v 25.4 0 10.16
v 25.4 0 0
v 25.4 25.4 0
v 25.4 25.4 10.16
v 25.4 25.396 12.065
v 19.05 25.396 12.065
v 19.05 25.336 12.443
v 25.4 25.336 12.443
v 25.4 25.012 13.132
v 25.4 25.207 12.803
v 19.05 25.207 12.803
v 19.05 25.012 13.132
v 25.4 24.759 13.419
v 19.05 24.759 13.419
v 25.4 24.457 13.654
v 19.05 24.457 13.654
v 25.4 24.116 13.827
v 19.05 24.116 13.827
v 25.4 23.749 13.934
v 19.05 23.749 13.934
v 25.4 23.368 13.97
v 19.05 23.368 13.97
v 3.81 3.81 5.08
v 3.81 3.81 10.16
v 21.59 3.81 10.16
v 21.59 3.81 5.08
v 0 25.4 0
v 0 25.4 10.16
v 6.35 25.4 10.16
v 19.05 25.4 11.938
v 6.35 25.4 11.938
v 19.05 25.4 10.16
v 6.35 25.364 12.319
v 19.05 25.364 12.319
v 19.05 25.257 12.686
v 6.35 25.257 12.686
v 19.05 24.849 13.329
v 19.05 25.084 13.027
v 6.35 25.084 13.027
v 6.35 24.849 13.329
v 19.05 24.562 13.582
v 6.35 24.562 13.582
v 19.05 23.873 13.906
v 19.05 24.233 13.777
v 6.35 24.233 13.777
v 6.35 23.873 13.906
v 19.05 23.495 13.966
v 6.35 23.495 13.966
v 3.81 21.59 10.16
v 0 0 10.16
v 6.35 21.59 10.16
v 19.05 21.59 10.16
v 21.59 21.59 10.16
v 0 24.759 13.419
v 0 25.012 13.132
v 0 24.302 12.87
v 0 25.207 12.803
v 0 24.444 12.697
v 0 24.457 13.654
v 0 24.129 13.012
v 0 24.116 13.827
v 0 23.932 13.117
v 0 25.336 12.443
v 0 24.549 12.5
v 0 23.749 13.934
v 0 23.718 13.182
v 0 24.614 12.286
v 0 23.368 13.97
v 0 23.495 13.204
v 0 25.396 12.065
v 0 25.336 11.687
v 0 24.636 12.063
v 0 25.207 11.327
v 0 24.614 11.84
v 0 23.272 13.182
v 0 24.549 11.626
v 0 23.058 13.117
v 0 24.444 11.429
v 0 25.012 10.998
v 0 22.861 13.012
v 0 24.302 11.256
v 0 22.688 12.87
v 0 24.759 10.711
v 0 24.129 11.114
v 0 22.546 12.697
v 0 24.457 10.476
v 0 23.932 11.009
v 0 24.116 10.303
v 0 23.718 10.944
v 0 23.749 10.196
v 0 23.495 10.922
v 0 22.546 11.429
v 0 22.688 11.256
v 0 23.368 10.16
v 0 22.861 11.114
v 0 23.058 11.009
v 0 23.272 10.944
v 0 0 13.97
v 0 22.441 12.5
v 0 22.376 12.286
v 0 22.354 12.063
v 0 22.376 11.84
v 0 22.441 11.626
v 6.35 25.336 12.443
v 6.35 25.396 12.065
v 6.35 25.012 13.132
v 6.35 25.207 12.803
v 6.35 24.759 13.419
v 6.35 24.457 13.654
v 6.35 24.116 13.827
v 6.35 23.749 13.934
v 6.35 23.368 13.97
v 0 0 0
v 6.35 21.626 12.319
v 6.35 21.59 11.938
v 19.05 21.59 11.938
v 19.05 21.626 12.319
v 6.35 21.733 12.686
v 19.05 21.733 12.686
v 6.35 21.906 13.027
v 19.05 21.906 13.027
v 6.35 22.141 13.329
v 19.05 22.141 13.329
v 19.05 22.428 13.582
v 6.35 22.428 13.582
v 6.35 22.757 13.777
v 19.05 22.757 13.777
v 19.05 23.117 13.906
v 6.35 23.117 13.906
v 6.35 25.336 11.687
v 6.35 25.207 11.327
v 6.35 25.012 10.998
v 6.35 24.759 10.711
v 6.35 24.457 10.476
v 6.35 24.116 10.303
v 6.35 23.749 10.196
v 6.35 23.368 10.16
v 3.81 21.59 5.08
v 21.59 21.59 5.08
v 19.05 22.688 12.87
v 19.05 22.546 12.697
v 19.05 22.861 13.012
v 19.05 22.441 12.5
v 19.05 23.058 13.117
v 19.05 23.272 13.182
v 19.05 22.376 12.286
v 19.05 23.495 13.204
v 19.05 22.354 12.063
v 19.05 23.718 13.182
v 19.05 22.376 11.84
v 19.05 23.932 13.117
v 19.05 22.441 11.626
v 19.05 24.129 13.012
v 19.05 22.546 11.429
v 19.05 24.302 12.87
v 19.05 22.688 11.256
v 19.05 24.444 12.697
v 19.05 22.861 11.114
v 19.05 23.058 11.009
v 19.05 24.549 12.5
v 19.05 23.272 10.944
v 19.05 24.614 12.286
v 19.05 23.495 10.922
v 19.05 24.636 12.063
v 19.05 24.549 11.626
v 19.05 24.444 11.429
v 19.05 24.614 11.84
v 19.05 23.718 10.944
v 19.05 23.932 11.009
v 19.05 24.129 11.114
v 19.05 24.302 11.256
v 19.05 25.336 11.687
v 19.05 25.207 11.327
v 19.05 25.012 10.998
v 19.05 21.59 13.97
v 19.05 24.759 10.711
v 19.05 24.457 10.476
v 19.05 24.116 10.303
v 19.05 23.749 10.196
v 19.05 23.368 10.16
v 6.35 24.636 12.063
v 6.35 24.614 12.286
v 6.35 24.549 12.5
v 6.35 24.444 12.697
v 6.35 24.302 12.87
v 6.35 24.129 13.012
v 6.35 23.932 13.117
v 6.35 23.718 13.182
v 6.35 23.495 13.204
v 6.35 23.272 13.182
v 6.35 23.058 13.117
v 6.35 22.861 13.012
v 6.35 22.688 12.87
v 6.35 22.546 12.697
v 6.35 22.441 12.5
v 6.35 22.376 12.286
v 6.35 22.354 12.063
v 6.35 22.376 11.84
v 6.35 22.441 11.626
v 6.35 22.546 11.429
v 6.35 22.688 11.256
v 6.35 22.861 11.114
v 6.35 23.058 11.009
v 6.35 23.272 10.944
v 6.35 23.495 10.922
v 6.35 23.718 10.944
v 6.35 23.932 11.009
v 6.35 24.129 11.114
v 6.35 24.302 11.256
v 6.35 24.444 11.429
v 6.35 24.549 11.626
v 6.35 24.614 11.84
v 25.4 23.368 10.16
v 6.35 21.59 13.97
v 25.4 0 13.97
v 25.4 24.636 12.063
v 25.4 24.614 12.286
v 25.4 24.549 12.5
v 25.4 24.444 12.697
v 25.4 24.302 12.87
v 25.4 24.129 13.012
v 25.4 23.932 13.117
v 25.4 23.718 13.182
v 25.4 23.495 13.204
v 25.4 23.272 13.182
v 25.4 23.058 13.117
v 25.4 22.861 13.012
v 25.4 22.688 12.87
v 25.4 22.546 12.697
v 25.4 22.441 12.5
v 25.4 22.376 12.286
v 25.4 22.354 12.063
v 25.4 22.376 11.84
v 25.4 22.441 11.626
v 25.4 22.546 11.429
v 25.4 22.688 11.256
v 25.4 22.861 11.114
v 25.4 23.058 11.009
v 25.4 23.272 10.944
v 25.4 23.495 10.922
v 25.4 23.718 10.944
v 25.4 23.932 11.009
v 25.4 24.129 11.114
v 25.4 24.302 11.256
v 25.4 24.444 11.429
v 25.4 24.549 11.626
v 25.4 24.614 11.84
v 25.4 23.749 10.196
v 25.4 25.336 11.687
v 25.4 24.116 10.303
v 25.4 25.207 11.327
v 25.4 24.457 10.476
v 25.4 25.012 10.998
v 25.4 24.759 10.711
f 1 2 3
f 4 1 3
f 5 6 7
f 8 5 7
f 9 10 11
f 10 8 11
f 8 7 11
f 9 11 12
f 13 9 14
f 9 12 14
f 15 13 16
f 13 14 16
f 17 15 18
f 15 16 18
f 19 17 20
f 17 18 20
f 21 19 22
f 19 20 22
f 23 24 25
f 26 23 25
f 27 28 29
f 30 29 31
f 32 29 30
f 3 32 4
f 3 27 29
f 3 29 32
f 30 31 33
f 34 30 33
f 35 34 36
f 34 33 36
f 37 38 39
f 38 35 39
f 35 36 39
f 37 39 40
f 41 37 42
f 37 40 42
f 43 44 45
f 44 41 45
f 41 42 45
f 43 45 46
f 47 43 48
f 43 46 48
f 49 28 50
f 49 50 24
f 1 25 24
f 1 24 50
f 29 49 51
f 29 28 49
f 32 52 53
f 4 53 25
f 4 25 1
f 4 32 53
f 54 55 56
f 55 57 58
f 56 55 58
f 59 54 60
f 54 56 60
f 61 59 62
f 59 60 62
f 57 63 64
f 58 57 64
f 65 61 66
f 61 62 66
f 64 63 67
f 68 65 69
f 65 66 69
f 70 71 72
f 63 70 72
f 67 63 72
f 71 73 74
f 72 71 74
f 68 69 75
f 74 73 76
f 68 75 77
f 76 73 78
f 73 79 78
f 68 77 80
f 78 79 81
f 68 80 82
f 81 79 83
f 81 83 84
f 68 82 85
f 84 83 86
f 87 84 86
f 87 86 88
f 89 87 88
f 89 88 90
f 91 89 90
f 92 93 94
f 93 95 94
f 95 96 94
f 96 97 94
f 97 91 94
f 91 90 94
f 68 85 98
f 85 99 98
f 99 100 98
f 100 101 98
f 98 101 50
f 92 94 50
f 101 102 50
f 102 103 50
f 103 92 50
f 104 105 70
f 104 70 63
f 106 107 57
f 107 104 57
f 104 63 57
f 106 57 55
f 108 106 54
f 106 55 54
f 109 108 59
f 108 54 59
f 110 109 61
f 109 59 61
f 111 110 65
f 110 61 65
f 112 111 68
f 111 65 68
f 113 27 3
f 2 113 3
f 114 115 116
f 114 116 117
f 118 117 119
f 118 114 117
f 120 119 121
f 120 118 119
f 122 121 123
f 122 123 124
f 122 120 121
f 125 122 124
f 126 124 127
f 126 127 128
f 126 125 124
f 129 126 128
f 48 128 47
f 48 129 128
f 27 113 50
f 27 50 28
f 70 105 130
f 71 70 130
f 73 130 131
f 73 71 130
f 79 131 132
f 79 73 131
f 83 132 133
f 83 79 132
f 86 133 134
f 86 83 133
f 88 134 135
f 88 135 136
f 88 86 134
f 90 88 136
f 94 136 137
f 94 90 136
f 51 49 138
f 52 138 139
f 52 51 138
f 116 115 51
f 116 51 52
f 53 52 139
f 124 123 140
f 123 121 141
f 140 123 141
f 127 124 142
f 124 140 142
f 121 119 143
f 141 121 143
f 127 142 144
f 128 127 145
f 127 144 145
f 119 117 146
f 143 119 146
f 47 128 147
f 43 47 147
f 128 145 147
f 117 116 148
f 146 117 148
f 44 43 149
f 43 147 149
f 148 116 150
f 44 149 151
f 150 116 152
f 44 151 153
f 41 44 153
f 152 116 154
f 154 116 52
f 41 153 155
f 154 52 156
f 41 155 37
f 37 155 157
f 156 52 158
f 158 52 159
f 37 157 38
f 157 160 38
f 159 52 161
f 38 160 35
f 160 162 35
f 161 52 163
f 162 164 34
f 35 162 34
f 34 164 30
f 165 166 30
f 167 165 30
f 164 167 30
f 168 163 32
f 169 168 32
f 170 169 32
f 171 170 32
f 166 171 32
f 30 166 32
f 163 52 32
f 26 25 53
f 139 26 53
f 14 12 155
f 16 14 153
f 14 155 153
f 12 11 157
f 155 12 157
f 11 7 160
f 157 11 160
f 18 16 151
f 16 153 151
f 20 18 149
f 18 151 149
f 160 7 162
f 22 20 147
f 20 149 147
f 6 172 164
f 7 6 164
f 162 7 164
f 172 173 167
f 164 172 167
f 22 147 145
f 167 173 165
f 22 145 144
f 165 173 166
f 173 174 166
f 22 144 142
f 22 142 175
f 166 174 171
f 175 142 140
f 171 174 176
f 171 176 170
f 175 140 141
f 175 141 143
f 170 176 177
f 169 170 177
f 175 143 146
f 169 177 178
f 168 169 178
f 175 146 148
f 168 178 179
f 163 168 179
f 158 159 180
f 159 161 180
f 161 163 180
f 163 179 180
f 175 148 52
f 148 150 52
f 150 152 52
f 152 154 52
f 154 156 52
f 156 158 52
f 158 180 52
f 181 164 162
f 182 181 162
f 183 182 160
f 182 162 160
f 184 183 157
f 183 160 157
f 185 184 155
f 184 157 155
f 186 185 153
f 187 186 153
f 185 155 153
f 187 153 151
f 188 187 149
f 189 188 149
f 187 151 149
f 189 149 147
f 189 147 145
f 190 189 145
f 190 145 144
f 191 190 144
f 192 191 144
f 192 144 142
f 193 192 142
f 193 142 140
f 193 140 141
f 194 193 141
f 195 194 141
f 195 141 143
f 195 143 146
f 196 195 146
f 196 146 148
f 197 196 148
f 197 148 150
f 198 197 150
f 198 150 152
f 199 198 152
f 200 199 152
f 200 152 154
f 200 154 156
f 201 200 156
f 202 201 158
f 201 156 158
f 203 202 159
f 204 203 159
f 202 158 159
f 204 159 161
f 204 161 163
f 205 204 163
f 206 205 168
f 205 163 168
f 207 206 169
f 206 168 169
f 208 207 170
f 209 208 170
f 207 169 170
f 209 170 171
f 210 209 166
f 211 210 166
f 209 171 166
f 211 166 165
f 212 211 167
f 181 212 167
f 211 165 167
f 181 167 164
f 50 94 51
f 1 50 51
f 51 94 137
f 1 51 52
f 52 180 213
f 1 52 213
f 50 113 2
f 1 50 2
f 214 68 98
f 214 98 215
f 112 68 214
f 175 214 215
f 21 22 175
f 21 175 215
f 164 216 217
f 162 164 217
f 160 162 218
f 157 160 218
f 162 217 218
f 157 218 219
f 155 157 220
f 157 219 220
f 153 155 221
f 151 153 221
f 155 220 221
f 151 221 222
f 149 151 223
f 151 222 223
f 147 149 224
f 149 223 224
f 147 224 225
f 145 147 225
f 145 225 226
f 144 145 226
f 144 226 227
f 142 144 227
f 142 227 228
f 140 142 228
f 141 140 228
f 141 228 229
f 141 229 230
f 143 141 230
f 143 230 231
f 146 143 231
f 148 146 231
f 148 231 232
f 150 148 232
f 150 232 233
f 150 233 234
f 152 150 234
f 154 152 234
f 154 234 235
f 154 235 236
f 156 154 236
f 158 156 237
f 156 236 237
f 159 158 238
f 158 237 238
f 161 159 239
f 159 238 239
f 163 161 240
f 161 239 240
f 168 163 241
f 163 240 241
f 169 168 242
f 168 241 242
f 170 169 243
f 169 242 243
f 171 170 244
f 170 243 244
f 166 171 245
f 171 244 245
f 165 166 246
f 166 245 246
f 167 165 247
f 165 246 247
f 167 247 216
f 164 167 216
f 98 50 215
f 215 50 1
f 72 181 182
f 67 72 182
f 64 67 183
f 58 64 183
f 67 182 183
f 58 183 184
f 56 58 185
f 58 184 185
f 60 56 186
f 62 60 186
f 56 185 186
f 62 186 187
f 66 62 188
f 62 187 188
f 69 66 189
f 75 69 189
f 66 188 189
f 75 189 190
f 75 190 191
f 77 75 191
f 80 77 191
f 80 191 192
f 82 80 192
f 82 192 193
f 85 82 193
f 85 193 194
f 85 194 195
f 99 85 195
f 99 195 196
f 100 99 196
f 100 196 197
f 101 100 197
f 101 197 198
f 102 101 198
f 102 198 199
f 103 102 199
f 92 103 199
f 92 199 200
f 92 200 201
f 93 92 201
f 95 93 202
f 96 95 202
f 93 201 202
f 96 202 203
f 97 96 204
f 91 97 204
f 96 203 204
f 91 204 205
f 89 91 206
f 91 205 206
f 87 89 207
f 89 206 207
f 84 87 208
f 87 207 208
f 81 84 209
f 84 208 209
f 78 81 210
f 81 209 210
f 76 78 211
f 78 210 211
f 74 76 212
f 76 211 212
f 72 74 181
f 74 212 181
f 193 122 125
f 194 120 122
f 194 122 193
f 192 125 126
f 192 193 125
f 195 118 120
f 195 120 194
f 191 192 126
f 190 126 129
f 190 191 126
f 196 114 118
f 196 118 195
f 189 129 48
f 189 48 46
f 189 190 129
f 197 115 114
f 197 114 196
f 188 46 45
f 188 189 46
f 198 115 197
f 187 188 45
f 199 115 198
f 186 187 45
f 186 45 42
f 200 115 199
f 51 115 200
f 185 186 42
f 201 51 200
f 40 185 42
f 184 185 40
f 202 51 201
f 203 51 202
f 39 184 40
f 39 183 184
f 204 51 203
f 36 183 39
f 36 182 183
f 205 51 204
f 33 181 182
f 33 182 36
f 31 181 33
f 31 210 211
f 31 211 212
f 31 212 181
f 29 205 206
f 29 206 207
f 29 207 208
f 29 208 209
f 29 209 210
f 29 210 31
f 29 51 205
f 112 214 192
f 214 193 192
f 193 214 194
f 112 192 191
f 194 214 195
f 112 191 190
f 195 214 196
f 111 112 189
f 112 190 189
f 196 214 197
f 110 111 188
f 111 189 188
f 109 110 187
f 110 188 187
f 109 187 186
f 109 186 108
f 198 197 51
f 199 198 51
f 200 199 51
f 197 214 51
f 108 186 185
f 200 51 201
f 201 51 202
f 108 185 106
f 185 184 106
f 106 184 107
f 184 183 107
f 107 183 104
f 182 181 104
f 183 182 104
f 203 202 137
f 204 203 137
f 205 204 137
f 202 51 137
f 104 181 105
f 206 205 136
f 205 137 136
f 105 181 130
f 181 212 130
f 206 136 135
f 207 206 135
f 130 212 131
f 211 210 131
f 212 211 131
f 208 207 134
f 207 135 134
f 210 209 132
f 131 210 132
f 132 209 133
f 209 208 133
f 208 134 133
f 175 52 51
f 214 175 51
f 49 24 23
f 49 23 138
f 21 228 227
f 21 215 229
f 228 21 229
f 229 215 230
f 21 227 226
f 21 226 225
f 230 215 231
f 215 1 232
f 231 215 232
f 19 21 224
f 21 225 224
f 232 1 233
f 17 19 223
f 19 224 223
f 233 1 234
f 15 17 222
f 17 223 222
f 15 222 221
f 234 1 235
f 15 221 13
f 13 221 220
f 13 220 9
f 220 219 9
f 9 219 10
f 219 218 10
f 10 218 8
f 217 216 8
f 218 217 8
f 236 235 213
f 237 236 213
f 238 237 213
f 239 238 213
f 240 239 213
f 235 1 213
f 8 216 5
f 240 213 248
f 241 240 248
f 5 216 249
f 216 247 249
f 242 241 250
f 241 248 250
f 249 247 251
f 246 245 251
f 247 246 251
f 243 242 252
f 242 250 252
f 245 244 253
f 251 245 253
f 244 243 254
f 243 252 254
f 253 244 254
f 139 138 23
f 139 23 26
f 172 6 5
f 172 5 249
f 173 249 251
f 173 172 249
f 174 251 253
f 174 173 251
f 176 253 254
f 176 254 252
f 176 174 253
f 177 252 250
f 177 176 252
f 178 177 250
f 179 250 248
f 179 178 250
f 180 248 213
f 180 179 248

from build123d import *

# Parameters (mm, degrees)
F0_W        = 25.4
F0_H        = 25.4
F1_DEPTH    = 10.16
F2_W        = 17.78
F2_H        = 17.78
F3_DEPTH    = 5.08
F4_W        = 6.35
F4_H        = 3.81
F5_DEPTH    = 3.81
F7_DEPTH    = 3.81
F8_T1_DEPTH = 16.51
F8_T3_DEPTH = 16.51
F9_T1_DEPTH = 22.86
F10_R       = 1.1410136833
F11_DEPTH   = 25.4


# Not quite as in the source:
# - a fillet or chamfer that OpenCascade refuses, or shapes differently, is made with other operations: its cross-section is extruded or revolved along the edge and cut away or added


with BuildPart() as f1:
    # F0 (on Top) → F1 (new body)
    with BuildSketch(Plane.XY):
        with Locations((12.7, 12.7)):
            Rectangle(F0_W, F0_H)
    extrude(amount=F1_DEPTH)

    # F2 (on face) → F3 (cut)
    with BuildSketch(Plane.XY.offset(10.16)):
        with Locations((12.7, 12.7)):
            Rectangle(F2_W, F2_H)
    extrude(amount=-F3_DEPTH, mode=Mode.SUBTRACT)

    # F4 (on face) → F5 (join)
    with BuildSketch(Plane.XY.offset(10.16)):
        with Locations((9.525, 23.495)):
            Rectangle(F4_W, F4_H)
        with Locations((15.875, 23.495)):
            Rectangle(F4_W, F4_H)
    extrude(amount=F5_DEPTH)

    # F9: fillet of radius 2.032 on 2 edges, made by hand

    # F9_s2 → F9_t1 (cut)
    with BuildSketch(Plane.YZ.offset(1.27)):
        with BuildLine():
            ThreePointArc((21.59, 11.938), (22.1851590206, 13.3748409794), (23.622, 13.97))
            Line((23.622, 13.97), (21.59, 13.97))
            Line((21.59, 13.97), (21.59, 11.938))
        make_face()
        with BuildLine():
            ThreePointArc((25.4, 11.938), (24.8048409794, 13.3748409794), (23.368, 13.97))
            Line((23.368, 13.97), (25.4, 13.97))
            Line((25.4, 13.97), (25.4, 11.938))
        make_face()
    extrude(amount=F9_T1_DEPTH, mode=Mode.SUBTRACT)


with BuildPart() as f7:
    # F6 (on face) → F7 (new body)
    with BuildSketch(Plane.XY.offset(10.16)):
        Polygon((3.81, 21.59), (0, 21.59), (0, 0), (25.4, 0), (25.4, 21.59), (21.59, 21.59), (21.59, 3.81), (3.81, 3.81), align=None)
        Polygon((6.35, 21.59), (3.81, 21.59), (3.81, 3.81), (21.59, 3.81), (21.59, 21.59), (19.05, 21.59), align=None)
        Polygon((19.05, 25.4), (19.05, 21.59), (21.59, 21.59), (25.4, 21.59), (25.4, 25.4), align=None)
        Polygon((0, 25.4), (0, 21.59), (3.81, 21.59), (6.35, 21.59), (6.35, 25.4), align=None)
    extrude(amount=F7_DEPTH)

    # F8: fillet of radius 2.032 on 4 edges, made by hand

    # F8_s2 → F8_t1 (cut)
    with BuildSketch(Plane.YZ.offset(-5.08)):
        with BuildLine():
            ThreePointArc((25.4, 12.192), (24.8048409794, 10.7551590206), (23.368, 10.16))
            Line((23.368, 10.16), (25.4, 10.16))
            Line((25.4, 10.16), (25.4, 12.192))
        make_face()
        with BuildLine():
            ThreePointArc((25.4, 11.938), (24.8048409794, 13.3748409794), (23.368, 13.97))
            Line((23.368, 13.97), (25.4, 13.97))
            Line((25.4, 13.97), (25.4, 11.938))
        make_face()
    extrude(amount=F8_T1_DEPTH, mode=Mode.SUBTRACT)

    # F8_s4 → F8_t3 (cut)
    with BuildSketch(Plane.YZ.offset(13.97)):
        with BuildLine():
            ThreePointArc((25.4, 11.938), (24.8048409794, 13.3748409794), (23.368, 13.97))
            Line((23.368, 13.97), (25.4, 13.97))
            Line((25.4, 13.97), (25.4, 11.938))
        make_face()
        with BuildLine():
            ThreePointArc((25.4, 12.192), (24.8048409794, 10.7551590206), (23.368, 10.16))
            Line((23.368, 10.16), (25.4, 10.16))
            Line((25.4, 10.16), (25.4, 12.192))
        make_face()
    extrude(amount=F8_T3_DEPTH, mode=Mode.SUBTRACT)


with BuildPart() as f11_tool:
    # F10 (on face) → F11 (new body)
    with BuildSketch(Plane.YZ.offset(25.4)):
        with Locations((23.495, 12.0630136833)):
            Circle(F10_R)
    extrude(amount=-F11_DEPTH)


with BuildPart() as f1_1:
    add(f1.part)

    # F11: cut by f11_tool
    add(f11_tool.part, mode=Mode.SUBTRACT)


with BuildPart() as f7_1:
    add(f7.part)

    # F11: cut by f11_tool
    add(f11_tool.part, mode=Mode.SUBTRACT)


solid = Compound([f1_1.part, f7_1.part])
